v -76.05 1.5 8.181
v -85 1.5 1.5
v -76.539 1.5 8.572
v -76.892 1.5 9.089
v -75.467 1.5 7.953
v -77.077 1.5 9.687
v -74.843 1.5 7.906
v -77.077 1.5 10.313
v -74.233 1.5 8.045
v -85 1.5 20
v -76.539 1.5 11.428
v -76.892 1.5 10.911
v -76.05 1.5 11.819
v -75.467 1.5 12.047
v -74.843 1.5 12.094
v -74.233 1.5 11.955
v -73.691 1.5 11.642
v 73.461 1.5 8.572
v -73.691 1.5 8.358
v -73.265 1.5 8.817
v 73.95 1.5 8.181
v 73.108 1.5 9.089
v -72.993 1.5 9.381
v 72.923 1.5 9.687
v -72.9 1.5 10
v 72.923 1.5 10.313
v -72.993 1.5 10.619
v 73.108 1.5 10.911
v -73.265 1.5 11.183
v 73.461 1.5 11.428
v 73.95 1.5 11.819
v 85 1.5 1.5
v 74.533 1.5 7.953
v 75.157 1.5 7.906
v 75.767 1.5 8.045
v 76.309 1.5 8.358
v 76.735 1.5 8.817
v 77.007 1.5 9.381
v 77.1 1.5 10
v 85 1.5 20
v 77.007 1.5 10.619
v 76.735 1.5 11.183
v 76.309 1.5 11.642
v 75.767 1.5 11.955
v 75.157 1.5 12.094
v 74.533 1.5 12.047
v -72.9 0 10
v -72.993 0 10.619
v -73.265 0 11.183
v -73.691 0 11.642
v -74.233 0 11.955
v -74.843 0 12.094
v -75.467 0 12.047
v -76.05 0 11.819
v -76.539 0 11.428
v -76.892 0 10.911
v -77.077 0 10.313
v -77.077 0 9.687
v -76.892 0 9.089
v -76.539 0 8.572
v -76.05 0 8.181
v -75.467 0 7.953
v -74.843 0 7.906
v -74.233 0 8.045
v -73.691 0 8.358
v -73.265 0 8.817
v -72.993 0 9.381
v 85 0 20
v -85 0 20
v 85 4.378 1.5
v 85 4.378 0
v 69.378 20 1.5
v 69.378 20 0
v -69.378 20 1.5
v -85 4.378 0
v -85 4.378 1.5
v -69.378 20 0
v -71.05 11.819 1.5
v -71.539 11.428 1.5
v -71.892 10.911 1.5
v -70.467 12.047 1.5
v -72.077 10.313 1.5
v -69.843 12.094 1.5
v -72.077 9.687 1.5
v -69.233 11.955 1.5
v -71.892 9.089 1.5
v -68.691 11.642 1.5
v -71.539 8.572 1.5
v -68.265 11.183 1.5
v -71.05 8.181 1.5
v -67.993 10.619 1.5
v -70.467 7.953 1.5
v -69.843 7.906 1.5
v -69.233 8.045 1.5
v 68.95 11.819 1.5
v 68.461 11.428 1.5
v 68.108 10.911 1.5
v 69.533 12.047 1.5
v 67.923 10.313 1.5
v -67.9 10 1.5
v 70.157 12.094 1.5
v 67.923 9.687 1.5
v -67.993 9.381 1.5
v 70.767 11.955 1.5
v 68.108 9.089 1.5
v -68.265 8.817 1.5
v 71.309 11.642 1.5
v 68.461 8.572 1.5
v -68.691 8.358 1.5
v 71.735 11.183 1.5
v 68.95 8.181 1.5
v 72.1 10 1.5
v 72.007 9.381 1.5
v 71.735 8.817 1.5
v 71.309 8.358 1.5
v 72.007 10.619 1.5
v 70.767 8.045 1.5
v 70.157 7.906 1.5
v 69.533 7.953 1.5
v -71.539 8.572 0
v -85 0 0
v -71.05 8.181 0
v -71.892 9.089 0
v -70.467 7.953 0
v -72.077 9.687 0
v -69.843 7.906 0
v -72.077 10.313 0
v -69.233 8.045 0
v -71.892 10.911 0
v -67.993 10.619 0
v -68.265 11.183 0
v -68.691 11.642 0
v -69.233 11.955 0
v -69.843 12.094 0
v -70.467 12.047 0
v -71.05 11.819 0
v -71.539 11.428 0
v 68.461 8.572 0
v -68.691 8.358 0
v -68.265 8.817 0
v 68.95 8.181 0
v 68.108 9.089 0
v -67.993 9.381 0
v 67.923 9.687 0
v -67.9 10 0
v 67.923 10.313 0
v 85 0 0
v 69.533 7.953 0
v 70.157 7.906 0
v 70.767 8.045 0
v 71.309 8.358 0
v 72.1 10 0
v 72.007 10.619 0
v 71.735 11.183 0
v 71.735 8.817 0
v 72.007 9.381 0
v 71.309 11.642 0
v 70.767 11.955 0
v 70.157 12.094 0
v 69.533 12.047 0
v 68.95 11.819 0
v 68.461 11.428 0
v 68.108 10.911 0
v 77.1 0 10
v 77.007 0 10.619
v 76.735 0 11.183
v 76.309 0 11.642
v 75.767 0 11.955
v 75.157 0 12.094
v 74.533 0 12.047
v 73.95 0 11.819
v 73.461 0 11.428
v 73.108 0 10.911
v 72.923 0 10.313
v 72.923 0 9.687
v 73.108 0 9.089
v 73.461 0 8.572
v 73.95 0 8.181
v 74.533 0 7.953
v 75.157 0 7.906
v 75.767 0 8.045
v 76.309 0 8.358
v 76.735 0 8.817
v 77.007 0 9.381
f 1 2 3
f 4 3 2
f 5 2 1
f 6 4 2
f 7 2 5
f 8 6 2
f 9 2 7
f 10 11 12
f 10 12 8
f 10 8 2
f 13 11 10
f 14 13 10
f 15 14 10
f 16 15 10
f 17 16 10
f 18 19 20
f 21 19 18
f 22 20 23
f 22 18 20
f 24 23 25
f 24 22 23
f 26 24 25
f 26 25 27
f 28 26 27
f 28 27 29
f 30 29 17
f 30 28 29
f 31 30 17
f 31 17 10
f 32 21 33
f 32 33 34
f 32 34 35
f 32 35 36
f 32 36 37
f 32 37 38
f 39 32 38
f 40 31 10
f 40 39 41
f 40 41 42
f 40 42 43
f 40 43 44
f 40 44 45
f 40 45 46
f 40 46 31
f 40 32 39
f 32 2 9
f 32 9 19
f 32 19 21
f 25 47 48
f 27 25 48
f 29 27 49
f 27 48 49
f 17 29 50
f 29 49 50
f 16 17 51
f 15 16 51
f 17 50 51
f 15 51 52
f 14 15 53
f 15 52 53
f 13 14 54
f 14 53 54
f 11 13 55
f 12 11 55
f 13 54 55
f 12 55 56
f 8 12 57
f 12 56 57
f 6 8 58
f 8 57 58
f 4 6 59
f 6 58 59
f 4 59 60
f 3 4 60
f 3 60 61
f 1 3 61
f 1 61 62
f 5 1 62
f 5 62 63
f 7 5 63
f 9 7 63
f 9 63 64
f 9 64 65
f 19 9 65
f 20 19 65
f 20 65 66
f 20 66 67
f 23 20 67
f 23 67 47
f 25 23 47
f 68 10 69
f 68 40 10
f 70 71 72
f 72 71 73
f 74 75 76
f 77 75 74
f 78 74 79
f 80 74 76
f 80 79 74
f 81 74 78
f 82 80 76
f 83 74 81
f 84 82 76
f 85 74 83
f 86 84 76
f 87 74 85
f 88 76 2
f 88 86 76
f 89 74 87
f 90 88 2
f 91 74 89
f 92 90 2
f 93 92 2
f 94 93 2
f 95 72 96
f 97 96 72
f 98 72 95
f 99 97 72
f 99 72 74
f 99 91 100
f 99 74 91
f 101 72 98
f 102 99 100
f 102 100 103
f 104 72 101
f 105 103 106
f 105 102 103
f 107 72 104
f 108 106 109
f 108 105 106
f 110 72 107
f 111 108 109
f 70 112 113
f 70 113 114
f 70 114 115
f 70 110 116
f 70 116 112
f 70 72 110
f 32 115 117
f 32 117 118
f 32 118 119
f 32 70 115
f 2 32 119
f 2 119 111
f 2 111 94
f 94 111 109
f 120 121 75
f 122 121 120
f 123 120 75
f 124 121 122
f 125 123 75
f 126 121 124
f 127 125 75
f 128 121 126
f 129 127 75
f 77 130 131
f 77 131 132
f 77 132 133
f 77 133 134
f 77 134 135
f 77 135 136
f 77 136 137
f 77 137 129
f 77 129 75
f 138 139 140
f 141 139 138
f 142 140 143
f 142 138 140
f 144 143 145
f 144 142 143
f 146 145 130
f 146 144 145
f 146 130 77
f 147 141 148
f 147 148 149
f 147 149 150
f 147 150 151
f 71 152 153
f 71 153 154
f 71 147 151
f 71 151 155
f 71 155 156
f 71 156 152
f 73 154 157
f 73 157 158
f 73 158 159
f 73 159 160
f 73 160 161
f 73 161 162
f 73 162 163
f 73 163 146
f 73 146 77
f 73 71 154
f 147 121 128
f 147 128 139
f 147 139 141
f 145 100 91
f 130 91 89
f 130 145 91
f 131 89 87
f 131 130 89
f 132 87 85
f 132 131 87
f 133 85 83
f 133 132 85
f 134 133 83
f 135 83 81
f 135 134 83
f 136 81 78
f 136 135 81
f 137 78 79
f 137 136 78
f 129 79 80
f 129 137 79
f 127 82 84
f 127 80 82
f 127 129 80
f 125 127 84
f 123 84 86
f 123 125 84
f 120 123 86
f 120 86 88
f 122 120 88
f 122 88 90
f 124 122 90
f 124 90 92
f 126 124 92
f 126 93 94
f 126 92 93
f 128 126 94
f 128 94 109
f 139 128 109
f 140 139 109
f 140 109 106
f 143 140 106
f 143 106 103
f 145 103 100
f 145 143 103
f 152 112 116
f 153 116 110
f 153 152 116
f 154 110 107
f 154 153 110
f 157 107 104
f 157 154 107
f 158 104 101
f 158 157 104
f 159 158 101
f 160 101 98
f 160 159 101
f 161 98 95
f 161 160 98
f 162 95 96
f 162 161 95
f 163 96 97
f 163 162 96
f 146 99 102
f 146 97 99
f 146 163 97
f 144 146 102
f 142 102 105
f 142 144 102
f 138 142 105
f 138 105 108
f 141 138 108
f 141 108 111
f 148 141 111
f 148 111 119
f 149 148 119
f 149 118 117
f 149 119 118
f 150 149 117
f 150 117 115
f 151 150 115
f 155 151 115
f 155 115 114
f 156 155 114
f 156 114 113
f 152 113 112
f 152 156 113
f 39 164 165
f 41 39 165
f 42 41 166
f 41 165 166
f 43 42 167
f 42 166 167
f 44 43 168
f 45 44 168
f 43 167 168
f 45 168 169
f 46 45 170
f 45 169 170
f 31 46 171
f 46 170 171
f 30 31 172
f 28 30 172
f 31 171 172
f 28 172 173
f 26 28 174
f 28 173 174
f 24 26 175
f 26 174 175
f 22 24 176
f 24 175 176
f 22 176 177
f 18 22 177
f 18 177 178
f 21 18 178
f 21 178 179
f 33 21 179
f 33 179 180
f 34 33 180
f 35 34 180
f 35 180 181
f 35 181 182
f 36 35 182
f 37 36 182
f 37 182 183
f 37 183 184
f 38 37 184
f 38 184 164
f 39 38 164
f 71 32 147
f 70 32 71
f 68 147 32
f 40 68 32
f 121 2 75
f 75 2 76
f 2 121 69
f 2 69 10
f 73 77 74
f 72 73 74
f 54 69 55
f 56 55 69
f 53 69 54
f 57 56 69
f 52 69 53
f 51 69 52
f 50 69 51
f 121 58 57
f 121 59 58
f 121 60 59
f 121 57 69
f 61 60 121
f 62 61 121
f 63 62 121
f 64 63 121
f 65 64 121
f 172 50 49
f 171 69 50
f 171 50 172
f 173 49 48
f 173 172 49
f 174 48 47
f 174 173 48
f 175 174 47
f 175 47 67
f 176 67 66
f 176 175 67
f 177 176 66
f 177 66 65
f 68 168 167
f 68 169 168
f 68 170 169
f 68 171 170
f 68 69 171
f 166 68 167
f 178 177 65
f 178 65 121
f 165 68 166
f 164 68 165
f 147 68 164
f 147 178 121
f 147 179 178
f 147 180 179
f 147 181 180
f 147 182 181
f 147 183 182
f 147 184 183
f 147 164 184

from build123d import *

# Parameters (mm, degrees)
PAD_DEPTH     = 85
SKETCH002_R   = 2.1
HOLE_DEPTH    = 20.001
SKETCH003_R   = 2.1
HOLE001_DEPTH = 20.001
POCKET_DEPTH  = 364.674759


with BuildPart() as part:
    # Sketch → Pad (new body, symmetric)
    with BuildSketch(Plane.YZ):
        Polygon((0, 0), (20, 0), (20, 1.5), (1.5, 1.5), (1.5, 20), (0, 20), align=None)
    extrude(amount=PAD_DEPTH, both=True)

    # Sketch002 → Hole (cut, through all)
    with BuildSketch(Plane.XZ):
        with Locations((-75, 10)):
            Circle(SKETCH002_R)
        with Locations((75, 10)):
            Circle(SKETCH002_R)
    extrude(amount=-HOLE_DEPTH, mode=Mode.SUBTRACT)

    # Sketch003 → Hole001 (cut, through all)
    with BuildSketch(Plane.XY):
        with Locations((-70, 10)):
            Circle(SKETCH003_R)
        with Locations((70, 10)):
            Circle(SKETCH003_R)
    extrude(amount=HOLE001_DEPTH, mode=Mode.SUBTRACT)

    # Sketch004 → Pocket (cut, through all)
    with BuildSketch(Plane.XY):
        Polygon((-85, 4.377634), (-49.377634, 40), (-85, 40), align=None)
    pocket = extrude(amount=POCKET_DEPTH, mode=Mode.SUBTRACT)

    # Mirrored: Pocket across YZ
    add(pocket.mirror(Plane.YZ), mode=Mode.SUBTRACT)


solid = part.part
